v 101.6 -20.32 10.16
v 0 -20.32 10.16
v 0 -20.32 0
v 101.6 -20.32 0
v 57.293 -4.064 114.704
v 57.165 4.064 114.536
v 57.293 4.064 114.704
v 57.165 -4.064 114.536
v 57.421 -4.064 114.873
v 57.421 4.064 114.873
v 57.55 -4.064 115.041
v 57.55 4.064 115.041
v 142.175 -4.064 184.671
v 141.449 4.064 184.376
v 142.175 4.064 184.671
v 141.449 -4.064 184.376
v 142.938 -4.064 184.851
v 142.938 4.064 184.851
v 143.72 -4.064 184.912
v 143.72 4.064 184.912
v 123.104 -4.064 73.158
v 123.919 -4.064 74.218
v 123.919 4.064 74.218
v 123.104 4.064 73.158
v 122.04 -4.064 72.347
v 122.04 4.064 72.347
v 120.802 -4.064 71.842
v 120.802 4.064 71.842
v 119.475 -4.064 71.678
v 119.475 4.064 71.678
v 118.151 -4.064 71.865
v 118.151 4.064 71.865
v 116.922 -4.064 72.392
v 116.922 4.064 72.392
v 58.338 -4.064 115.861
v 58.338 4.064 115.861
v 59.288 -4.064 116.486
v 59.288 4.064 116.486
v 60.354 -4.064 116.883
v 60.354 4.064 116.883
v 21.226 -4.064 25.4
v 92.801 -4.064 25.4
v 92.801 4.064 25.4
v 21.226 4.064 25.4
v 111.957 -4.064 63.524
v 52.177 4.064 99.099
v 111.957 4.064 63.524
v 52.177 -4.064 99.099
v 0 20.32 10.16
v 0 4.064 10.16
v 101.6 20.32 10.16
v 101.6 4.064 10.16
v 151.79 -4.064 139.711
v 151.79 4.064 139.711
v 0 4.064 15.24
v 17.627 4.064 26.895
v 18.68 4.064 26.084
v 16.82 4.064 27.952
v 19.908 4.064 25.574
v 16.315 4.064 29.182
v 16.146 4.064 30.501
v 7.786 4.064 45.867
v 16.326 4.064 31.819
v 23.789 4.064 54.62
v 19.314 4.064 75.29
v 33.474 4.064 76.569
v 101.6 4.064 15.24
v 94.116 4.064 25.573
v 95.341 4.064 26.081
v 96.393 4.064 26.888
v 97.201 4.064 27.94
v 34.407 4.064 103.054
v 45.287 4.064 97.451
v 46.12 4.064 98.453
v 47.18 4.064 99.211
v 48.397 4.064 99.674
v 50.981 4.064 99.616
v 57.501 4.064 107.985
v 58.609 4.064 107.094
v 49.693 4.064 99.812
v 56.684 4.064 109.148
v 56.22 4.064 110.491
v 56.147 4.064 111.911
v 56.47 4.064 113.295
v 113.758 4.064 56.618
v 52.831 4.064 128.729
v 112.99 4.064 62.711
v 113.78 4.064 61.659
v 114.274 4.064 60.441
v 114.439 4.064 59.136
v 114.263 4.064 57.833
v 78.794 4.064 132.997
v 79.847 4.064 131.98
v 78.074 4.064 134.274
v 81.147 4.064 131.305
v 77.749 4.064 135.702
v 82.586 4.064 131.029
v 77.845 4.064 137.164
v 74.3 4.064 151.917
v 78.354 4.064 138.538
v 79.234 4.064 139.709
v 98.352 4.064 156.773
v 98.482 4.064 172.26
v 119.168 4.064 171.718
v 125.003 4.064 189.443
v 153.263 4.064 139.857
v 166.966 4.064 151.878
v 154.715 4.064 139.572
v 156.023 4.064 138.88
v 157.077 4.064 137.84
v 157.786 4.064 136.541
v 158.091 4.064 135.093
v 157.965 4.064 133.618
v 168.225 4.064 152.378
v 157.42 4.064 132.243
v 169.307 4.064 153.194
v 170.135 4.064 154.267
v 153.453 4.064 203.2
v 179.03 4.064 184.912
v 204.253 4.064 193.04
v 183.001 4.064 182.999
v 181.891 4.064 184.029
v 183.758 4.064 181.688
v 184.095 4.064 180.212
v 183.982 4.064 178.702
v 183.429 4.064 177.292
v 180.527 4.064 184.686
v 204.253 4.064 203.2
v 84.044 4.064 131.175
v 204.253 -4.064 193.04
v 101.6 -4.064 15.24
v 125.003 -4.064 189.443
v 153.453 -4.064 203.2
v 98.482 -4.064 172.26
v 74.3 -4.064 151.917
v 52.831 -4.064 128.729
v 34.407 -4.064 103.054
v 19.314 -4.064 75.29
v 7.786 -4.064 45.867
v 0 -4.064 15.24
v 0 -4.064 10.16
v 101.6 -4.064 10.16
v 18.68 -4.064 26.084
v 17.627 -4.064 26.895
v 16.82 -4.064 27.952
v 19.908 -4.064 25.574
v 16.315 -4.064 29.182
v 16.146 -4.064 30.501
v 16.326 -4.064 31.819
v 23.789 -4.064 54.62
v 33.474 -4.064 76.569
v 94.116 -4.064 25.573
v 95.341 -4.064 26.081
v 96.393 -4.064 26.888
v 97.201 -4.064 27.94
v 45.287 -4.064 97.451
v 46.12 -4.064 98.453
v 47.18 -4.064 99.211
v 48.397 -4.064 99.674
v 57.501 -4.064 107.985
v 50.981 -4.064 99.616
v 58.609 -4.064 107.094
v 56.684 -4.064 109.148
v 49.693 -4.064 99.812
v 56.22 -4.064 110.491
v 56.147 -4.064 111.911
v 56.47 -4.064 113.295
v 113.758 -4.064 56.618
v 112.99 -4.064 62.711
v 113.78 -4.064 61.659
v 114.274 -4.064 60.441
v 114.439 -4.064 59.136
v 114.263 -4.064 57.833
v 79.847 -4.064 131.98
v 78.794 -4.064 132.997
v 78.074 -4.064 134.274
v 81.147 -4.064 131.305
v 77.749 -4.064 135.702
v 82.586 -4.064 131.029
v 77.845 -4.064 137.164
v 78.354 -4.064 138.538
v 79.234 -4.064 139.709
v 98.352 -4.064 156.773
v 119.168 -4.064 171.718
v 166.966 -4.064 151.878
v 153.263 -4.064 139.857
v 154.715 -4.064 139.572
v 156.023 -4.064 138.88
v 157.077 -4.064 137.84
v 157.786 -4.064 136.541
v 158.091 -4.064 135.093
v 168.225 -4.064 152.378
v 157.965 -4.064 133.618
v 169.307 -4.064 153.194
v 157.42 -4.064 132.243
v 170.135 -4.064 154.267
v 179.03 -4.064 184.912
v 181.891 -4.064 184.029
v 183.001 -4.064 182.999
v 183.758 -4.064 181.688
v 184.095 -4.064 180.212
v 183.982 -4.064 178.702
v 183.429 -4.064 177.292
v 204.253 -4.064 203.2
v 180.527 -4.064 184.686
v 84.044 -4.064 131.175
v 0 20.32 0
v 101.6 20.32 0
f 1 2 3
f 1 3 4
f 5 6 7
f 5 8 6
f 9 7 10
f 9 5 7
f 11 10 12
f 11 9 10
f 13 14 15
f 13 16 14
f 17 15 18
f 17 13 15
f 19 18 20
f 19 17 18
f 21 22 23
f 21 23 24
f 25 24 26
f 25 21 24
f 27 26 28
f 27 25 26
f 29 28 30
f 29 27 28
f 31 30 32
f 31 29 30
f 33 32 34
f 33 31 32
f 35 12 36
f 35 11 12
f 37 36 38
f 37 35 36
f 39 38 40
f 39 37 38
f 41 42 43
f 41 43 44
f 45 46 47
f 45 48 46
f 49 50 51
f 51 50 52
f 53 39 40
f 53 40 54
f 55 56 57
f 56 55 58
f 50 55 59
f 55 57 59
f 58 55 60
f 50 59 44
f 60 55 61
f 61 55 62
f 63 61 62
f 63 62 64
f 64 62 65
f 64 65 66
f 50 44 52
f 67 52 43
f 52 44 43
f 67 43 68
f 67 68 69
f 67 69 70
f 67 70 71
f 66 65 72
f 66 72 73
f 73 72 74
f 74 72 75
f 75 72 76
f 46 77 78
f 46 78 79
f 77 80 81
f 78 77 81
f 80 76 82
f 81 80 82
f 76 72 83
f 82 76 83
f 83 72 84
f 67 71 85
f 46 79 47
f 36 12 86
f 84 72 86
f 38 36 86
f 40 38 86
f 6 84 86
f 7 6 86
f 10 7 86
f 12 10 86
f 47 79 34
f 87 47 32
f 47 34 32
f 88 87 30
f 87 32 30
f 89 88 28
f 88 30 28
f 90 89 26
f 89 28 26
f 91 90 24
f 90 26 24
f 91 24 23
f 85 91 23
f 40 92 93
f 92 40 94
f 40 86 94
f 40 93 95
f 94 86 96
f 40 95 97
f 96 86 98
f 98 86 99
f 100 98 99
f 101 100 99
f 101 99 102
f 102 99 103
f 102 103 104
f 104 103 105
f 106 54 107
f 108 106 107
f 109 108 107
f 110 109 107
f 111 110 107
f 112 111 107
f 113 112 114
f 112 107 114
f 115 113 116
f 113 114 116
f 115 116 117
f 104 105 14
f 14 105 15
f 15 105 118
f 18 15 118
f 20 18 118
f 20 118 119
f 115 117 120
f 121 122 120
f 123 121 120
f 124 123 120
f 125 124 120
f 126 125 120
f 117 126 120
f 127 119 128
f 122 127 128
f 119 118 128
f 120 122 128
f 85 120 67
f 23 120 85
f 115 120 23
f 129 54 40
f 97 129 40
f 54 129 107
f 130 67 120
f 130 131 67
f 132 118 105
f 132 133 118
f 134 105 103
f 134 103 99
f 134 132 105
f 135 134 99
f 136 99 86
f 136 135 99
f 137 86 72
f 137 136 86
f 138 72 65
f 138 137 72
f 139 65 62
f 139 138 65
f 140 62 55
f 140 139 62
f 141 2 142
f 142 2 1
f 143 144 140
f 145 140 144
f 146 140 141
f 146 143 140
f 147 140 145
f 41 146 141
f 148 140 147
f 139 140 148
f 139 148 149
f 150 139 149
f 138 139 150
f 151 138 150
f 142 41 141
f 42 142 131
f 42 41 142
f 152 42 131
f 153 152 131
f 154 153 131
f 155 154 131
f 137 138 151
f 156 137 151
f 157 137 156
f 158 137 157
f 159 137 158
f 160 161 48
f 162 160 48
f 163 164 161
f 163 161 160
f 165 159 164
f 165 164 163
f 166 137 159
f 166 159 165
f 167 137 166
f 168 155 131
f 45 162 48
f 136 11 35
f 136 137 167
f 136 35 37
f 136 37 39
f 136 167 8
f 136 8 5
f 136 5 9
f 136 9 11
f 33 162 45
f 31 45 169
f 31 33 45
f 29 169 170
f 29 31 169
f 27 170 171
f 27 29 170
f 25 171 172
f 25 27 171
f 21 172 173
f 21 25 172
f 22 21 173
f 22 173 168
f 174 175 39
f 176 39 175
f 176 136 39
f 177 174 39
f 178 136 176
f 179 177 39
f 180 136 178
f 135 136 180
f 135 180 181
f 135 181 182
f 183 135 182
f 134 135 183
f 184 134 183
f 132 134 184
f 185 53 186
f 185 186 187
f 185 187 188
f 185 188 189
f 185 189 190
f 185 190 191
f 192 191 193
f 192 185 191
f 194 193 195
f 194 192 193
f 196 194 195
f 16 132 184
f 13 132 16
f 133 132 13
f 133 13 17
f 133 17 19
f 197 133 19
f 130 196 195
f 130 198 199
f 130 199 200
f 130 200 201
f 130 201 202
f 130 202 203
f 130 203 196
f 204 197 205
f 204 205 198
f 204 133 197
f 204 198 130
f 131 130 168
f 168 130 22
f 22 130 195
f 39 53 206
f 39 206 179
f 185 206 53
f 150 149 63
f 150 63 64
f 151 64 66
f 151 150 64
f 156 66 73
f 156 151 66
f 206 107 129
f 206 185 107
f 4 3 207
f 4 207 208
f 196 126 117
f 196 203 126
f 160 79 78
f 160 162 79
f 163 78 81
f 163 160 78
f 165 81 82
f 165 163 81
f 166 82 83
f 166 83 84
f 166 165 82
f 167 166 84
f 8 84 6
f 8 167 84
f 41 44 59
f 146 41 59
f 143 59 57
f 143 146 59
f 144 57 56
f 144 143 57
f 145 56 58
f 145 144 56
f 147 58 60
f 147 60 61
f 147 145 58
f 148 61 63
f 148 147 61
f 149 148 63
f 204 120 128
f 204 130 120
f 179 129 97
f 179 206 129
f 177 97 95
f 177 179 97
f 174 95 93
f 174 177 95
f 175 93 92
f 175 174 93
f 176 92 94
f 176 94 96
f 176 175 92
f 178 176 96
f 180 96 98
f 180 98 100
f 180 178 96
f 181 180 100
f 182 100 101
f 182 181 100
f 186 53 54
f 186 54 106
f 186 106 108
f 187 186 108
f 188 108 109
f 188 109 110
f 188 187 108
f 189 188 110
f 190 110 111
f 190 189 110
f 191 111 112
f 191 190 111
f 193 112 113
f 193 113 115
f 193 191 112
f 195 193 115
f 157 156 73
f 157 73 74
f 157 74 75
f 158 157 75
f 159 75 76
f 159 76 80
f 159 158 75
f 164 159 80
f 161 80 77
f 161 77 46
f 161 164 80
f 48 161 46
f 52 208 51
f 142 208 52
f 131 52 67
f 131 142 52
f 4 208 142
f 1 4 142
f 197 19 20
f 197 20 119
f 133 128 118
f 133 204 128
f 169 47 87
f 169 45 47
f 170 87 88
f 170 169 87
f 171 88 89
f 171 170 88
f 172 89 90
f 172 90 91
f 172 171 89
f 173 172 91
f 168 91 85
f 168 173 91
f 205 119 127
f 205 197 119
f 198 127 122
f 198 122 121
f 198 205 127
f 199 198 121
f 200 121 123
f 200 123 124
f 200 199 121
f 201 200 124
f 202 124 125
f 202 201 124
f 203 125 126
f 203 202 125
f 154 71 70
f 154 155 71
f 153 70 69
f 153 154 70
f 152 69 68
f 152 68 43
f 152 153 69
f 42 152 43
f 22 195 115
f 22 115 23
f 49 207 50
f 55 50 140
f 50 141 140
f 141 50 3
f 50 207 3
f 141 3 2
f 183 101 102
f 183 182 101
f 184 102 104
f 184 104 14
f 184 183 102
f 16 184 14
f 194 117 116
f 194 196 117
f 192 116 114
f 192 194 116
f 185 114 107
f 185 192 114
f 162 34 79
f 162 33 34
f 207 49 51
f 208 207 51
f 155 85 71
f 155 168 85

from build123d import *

# Parameters (mm, degrees)
F1_DEPTH = 4.064
F0_W     = 101.6
F0_H     = 10.16
F2_DEPTH = 20.32


with BuildPart() as f1:
    # F0 (on Front) → F1 (new body, symmetric)
    with BuildSketch(Plane.XZ):
        with BuildLine():
            ThreePointArc((153.452878, 203.2), (52.830692, 128.728784), (0, 15.24))
            Line((0, 15.24), (0, 10.16))
            Line((0, 10.16), (101.6, 10.16))
            Line((101.6, 10.16), (101.6, 15.24))
            Line((101.6, 15.24), (204.252878, 193.04))
            Line((204.252878, 193.04), (204.252878, 203.2))
            Line((204.252878, 203.2), (153.452878, 203.2))
        make_face()
        with BuildLine():
            Line((92.801182, 25.4), (21.226424, 25.4))
            ThreePointArc((21.226424, 25.4), (17.188655, 27.397336), (16.325996, 31.818734))
            ThreePointArc((16.325996, 31.818734), (28.359119, 65.714775), (45.287139, 97.450871))
            ThreePointArc((45.287139, 97.450871), (48.39745, 99.67396), (52.177043, 99.098778))
            Line((52.177043, 99.098778), (111.956531, 63.523804))
            ThreePointArc((111.956531, 63.523804), (114.27411, 60.440693), (113.758037, 56.618337))
            Line((113.758037, 56.618337), (97.200591, 27.94))
            ThreePointArc((97.200591, 27.94), (95.341182, 26.080591), (92.801182, 25.4))
        make_face(mode=Mode.SUBTRACT)
        with BuildLine():
            Line((60.353951, 116.882829), (151.789779, 139.711306))
            ThreePointArc((151.789779, 139.711306), (157.076895, 137.840462), (157.419723, 132.242596))
            Line((157.419723, 132.242596), (123.918924, 74.21751))
            ThreePointArc((123.918924, 74.21751), (120.801871, 71.842028), (116.921611, 72.392043))
            Line((116.921611, 72.392043), (58.60911, 107.094008))
            ThreePointArc((58.60911, 107.094008), (56.220096, 110.491455), (57.164538, 114.535965))
            ThreePointArc((57.164538, 114.535965), (57.357158, 114.788721), (57.550111, 115.041224))
            ThreePointArc((57.550111, 115.041224), (58.795634, 116.200141), (60.353951, 116.882829))
        make_face(mode=Mode.SUBTRACT)
        with BuildLine():
            Line((143.720428, 184.912), (179.029599, 184.912))
            ThreePointArc((179.029599, 184.912), (183.429008, 182.372), (183.429008, 177.292))
            Line((183.429008, 177.292), (170.135294, 154.266611))
            ThreePointArc((170.135294, 154.266611), (168.793752, 152.75003), (166.966419, 151.877901))
            Line((166.966419, 151.877901), (84.043811, 131.174891))
            ThreePointArc((84.043811, 131.174891), (78.387658, 133.609547), (79.234455, 139.708936))
            ThreePointArc((79.234455, 139.708936), (108.561894, 164.521107), (141.448627, 184.375712))
            ThreePointArc((141.448627, 184.375712), (142.553307, 184.776111), (143.720428, 184.912))
        make_face(mode=Mode.SUBTRACT)
    extrude(amount=F1_DEPTH, both=True)

    # F0 (on Front) → F2 (join, symmetric)
    with BuildSketch(Plane.XZ):
        with Locations((50.8, 5.08)):
            Rectangle(F0_W, F0_H)
    extrude(amount=F2_DEPTH, both=True)


solid = f1.part
